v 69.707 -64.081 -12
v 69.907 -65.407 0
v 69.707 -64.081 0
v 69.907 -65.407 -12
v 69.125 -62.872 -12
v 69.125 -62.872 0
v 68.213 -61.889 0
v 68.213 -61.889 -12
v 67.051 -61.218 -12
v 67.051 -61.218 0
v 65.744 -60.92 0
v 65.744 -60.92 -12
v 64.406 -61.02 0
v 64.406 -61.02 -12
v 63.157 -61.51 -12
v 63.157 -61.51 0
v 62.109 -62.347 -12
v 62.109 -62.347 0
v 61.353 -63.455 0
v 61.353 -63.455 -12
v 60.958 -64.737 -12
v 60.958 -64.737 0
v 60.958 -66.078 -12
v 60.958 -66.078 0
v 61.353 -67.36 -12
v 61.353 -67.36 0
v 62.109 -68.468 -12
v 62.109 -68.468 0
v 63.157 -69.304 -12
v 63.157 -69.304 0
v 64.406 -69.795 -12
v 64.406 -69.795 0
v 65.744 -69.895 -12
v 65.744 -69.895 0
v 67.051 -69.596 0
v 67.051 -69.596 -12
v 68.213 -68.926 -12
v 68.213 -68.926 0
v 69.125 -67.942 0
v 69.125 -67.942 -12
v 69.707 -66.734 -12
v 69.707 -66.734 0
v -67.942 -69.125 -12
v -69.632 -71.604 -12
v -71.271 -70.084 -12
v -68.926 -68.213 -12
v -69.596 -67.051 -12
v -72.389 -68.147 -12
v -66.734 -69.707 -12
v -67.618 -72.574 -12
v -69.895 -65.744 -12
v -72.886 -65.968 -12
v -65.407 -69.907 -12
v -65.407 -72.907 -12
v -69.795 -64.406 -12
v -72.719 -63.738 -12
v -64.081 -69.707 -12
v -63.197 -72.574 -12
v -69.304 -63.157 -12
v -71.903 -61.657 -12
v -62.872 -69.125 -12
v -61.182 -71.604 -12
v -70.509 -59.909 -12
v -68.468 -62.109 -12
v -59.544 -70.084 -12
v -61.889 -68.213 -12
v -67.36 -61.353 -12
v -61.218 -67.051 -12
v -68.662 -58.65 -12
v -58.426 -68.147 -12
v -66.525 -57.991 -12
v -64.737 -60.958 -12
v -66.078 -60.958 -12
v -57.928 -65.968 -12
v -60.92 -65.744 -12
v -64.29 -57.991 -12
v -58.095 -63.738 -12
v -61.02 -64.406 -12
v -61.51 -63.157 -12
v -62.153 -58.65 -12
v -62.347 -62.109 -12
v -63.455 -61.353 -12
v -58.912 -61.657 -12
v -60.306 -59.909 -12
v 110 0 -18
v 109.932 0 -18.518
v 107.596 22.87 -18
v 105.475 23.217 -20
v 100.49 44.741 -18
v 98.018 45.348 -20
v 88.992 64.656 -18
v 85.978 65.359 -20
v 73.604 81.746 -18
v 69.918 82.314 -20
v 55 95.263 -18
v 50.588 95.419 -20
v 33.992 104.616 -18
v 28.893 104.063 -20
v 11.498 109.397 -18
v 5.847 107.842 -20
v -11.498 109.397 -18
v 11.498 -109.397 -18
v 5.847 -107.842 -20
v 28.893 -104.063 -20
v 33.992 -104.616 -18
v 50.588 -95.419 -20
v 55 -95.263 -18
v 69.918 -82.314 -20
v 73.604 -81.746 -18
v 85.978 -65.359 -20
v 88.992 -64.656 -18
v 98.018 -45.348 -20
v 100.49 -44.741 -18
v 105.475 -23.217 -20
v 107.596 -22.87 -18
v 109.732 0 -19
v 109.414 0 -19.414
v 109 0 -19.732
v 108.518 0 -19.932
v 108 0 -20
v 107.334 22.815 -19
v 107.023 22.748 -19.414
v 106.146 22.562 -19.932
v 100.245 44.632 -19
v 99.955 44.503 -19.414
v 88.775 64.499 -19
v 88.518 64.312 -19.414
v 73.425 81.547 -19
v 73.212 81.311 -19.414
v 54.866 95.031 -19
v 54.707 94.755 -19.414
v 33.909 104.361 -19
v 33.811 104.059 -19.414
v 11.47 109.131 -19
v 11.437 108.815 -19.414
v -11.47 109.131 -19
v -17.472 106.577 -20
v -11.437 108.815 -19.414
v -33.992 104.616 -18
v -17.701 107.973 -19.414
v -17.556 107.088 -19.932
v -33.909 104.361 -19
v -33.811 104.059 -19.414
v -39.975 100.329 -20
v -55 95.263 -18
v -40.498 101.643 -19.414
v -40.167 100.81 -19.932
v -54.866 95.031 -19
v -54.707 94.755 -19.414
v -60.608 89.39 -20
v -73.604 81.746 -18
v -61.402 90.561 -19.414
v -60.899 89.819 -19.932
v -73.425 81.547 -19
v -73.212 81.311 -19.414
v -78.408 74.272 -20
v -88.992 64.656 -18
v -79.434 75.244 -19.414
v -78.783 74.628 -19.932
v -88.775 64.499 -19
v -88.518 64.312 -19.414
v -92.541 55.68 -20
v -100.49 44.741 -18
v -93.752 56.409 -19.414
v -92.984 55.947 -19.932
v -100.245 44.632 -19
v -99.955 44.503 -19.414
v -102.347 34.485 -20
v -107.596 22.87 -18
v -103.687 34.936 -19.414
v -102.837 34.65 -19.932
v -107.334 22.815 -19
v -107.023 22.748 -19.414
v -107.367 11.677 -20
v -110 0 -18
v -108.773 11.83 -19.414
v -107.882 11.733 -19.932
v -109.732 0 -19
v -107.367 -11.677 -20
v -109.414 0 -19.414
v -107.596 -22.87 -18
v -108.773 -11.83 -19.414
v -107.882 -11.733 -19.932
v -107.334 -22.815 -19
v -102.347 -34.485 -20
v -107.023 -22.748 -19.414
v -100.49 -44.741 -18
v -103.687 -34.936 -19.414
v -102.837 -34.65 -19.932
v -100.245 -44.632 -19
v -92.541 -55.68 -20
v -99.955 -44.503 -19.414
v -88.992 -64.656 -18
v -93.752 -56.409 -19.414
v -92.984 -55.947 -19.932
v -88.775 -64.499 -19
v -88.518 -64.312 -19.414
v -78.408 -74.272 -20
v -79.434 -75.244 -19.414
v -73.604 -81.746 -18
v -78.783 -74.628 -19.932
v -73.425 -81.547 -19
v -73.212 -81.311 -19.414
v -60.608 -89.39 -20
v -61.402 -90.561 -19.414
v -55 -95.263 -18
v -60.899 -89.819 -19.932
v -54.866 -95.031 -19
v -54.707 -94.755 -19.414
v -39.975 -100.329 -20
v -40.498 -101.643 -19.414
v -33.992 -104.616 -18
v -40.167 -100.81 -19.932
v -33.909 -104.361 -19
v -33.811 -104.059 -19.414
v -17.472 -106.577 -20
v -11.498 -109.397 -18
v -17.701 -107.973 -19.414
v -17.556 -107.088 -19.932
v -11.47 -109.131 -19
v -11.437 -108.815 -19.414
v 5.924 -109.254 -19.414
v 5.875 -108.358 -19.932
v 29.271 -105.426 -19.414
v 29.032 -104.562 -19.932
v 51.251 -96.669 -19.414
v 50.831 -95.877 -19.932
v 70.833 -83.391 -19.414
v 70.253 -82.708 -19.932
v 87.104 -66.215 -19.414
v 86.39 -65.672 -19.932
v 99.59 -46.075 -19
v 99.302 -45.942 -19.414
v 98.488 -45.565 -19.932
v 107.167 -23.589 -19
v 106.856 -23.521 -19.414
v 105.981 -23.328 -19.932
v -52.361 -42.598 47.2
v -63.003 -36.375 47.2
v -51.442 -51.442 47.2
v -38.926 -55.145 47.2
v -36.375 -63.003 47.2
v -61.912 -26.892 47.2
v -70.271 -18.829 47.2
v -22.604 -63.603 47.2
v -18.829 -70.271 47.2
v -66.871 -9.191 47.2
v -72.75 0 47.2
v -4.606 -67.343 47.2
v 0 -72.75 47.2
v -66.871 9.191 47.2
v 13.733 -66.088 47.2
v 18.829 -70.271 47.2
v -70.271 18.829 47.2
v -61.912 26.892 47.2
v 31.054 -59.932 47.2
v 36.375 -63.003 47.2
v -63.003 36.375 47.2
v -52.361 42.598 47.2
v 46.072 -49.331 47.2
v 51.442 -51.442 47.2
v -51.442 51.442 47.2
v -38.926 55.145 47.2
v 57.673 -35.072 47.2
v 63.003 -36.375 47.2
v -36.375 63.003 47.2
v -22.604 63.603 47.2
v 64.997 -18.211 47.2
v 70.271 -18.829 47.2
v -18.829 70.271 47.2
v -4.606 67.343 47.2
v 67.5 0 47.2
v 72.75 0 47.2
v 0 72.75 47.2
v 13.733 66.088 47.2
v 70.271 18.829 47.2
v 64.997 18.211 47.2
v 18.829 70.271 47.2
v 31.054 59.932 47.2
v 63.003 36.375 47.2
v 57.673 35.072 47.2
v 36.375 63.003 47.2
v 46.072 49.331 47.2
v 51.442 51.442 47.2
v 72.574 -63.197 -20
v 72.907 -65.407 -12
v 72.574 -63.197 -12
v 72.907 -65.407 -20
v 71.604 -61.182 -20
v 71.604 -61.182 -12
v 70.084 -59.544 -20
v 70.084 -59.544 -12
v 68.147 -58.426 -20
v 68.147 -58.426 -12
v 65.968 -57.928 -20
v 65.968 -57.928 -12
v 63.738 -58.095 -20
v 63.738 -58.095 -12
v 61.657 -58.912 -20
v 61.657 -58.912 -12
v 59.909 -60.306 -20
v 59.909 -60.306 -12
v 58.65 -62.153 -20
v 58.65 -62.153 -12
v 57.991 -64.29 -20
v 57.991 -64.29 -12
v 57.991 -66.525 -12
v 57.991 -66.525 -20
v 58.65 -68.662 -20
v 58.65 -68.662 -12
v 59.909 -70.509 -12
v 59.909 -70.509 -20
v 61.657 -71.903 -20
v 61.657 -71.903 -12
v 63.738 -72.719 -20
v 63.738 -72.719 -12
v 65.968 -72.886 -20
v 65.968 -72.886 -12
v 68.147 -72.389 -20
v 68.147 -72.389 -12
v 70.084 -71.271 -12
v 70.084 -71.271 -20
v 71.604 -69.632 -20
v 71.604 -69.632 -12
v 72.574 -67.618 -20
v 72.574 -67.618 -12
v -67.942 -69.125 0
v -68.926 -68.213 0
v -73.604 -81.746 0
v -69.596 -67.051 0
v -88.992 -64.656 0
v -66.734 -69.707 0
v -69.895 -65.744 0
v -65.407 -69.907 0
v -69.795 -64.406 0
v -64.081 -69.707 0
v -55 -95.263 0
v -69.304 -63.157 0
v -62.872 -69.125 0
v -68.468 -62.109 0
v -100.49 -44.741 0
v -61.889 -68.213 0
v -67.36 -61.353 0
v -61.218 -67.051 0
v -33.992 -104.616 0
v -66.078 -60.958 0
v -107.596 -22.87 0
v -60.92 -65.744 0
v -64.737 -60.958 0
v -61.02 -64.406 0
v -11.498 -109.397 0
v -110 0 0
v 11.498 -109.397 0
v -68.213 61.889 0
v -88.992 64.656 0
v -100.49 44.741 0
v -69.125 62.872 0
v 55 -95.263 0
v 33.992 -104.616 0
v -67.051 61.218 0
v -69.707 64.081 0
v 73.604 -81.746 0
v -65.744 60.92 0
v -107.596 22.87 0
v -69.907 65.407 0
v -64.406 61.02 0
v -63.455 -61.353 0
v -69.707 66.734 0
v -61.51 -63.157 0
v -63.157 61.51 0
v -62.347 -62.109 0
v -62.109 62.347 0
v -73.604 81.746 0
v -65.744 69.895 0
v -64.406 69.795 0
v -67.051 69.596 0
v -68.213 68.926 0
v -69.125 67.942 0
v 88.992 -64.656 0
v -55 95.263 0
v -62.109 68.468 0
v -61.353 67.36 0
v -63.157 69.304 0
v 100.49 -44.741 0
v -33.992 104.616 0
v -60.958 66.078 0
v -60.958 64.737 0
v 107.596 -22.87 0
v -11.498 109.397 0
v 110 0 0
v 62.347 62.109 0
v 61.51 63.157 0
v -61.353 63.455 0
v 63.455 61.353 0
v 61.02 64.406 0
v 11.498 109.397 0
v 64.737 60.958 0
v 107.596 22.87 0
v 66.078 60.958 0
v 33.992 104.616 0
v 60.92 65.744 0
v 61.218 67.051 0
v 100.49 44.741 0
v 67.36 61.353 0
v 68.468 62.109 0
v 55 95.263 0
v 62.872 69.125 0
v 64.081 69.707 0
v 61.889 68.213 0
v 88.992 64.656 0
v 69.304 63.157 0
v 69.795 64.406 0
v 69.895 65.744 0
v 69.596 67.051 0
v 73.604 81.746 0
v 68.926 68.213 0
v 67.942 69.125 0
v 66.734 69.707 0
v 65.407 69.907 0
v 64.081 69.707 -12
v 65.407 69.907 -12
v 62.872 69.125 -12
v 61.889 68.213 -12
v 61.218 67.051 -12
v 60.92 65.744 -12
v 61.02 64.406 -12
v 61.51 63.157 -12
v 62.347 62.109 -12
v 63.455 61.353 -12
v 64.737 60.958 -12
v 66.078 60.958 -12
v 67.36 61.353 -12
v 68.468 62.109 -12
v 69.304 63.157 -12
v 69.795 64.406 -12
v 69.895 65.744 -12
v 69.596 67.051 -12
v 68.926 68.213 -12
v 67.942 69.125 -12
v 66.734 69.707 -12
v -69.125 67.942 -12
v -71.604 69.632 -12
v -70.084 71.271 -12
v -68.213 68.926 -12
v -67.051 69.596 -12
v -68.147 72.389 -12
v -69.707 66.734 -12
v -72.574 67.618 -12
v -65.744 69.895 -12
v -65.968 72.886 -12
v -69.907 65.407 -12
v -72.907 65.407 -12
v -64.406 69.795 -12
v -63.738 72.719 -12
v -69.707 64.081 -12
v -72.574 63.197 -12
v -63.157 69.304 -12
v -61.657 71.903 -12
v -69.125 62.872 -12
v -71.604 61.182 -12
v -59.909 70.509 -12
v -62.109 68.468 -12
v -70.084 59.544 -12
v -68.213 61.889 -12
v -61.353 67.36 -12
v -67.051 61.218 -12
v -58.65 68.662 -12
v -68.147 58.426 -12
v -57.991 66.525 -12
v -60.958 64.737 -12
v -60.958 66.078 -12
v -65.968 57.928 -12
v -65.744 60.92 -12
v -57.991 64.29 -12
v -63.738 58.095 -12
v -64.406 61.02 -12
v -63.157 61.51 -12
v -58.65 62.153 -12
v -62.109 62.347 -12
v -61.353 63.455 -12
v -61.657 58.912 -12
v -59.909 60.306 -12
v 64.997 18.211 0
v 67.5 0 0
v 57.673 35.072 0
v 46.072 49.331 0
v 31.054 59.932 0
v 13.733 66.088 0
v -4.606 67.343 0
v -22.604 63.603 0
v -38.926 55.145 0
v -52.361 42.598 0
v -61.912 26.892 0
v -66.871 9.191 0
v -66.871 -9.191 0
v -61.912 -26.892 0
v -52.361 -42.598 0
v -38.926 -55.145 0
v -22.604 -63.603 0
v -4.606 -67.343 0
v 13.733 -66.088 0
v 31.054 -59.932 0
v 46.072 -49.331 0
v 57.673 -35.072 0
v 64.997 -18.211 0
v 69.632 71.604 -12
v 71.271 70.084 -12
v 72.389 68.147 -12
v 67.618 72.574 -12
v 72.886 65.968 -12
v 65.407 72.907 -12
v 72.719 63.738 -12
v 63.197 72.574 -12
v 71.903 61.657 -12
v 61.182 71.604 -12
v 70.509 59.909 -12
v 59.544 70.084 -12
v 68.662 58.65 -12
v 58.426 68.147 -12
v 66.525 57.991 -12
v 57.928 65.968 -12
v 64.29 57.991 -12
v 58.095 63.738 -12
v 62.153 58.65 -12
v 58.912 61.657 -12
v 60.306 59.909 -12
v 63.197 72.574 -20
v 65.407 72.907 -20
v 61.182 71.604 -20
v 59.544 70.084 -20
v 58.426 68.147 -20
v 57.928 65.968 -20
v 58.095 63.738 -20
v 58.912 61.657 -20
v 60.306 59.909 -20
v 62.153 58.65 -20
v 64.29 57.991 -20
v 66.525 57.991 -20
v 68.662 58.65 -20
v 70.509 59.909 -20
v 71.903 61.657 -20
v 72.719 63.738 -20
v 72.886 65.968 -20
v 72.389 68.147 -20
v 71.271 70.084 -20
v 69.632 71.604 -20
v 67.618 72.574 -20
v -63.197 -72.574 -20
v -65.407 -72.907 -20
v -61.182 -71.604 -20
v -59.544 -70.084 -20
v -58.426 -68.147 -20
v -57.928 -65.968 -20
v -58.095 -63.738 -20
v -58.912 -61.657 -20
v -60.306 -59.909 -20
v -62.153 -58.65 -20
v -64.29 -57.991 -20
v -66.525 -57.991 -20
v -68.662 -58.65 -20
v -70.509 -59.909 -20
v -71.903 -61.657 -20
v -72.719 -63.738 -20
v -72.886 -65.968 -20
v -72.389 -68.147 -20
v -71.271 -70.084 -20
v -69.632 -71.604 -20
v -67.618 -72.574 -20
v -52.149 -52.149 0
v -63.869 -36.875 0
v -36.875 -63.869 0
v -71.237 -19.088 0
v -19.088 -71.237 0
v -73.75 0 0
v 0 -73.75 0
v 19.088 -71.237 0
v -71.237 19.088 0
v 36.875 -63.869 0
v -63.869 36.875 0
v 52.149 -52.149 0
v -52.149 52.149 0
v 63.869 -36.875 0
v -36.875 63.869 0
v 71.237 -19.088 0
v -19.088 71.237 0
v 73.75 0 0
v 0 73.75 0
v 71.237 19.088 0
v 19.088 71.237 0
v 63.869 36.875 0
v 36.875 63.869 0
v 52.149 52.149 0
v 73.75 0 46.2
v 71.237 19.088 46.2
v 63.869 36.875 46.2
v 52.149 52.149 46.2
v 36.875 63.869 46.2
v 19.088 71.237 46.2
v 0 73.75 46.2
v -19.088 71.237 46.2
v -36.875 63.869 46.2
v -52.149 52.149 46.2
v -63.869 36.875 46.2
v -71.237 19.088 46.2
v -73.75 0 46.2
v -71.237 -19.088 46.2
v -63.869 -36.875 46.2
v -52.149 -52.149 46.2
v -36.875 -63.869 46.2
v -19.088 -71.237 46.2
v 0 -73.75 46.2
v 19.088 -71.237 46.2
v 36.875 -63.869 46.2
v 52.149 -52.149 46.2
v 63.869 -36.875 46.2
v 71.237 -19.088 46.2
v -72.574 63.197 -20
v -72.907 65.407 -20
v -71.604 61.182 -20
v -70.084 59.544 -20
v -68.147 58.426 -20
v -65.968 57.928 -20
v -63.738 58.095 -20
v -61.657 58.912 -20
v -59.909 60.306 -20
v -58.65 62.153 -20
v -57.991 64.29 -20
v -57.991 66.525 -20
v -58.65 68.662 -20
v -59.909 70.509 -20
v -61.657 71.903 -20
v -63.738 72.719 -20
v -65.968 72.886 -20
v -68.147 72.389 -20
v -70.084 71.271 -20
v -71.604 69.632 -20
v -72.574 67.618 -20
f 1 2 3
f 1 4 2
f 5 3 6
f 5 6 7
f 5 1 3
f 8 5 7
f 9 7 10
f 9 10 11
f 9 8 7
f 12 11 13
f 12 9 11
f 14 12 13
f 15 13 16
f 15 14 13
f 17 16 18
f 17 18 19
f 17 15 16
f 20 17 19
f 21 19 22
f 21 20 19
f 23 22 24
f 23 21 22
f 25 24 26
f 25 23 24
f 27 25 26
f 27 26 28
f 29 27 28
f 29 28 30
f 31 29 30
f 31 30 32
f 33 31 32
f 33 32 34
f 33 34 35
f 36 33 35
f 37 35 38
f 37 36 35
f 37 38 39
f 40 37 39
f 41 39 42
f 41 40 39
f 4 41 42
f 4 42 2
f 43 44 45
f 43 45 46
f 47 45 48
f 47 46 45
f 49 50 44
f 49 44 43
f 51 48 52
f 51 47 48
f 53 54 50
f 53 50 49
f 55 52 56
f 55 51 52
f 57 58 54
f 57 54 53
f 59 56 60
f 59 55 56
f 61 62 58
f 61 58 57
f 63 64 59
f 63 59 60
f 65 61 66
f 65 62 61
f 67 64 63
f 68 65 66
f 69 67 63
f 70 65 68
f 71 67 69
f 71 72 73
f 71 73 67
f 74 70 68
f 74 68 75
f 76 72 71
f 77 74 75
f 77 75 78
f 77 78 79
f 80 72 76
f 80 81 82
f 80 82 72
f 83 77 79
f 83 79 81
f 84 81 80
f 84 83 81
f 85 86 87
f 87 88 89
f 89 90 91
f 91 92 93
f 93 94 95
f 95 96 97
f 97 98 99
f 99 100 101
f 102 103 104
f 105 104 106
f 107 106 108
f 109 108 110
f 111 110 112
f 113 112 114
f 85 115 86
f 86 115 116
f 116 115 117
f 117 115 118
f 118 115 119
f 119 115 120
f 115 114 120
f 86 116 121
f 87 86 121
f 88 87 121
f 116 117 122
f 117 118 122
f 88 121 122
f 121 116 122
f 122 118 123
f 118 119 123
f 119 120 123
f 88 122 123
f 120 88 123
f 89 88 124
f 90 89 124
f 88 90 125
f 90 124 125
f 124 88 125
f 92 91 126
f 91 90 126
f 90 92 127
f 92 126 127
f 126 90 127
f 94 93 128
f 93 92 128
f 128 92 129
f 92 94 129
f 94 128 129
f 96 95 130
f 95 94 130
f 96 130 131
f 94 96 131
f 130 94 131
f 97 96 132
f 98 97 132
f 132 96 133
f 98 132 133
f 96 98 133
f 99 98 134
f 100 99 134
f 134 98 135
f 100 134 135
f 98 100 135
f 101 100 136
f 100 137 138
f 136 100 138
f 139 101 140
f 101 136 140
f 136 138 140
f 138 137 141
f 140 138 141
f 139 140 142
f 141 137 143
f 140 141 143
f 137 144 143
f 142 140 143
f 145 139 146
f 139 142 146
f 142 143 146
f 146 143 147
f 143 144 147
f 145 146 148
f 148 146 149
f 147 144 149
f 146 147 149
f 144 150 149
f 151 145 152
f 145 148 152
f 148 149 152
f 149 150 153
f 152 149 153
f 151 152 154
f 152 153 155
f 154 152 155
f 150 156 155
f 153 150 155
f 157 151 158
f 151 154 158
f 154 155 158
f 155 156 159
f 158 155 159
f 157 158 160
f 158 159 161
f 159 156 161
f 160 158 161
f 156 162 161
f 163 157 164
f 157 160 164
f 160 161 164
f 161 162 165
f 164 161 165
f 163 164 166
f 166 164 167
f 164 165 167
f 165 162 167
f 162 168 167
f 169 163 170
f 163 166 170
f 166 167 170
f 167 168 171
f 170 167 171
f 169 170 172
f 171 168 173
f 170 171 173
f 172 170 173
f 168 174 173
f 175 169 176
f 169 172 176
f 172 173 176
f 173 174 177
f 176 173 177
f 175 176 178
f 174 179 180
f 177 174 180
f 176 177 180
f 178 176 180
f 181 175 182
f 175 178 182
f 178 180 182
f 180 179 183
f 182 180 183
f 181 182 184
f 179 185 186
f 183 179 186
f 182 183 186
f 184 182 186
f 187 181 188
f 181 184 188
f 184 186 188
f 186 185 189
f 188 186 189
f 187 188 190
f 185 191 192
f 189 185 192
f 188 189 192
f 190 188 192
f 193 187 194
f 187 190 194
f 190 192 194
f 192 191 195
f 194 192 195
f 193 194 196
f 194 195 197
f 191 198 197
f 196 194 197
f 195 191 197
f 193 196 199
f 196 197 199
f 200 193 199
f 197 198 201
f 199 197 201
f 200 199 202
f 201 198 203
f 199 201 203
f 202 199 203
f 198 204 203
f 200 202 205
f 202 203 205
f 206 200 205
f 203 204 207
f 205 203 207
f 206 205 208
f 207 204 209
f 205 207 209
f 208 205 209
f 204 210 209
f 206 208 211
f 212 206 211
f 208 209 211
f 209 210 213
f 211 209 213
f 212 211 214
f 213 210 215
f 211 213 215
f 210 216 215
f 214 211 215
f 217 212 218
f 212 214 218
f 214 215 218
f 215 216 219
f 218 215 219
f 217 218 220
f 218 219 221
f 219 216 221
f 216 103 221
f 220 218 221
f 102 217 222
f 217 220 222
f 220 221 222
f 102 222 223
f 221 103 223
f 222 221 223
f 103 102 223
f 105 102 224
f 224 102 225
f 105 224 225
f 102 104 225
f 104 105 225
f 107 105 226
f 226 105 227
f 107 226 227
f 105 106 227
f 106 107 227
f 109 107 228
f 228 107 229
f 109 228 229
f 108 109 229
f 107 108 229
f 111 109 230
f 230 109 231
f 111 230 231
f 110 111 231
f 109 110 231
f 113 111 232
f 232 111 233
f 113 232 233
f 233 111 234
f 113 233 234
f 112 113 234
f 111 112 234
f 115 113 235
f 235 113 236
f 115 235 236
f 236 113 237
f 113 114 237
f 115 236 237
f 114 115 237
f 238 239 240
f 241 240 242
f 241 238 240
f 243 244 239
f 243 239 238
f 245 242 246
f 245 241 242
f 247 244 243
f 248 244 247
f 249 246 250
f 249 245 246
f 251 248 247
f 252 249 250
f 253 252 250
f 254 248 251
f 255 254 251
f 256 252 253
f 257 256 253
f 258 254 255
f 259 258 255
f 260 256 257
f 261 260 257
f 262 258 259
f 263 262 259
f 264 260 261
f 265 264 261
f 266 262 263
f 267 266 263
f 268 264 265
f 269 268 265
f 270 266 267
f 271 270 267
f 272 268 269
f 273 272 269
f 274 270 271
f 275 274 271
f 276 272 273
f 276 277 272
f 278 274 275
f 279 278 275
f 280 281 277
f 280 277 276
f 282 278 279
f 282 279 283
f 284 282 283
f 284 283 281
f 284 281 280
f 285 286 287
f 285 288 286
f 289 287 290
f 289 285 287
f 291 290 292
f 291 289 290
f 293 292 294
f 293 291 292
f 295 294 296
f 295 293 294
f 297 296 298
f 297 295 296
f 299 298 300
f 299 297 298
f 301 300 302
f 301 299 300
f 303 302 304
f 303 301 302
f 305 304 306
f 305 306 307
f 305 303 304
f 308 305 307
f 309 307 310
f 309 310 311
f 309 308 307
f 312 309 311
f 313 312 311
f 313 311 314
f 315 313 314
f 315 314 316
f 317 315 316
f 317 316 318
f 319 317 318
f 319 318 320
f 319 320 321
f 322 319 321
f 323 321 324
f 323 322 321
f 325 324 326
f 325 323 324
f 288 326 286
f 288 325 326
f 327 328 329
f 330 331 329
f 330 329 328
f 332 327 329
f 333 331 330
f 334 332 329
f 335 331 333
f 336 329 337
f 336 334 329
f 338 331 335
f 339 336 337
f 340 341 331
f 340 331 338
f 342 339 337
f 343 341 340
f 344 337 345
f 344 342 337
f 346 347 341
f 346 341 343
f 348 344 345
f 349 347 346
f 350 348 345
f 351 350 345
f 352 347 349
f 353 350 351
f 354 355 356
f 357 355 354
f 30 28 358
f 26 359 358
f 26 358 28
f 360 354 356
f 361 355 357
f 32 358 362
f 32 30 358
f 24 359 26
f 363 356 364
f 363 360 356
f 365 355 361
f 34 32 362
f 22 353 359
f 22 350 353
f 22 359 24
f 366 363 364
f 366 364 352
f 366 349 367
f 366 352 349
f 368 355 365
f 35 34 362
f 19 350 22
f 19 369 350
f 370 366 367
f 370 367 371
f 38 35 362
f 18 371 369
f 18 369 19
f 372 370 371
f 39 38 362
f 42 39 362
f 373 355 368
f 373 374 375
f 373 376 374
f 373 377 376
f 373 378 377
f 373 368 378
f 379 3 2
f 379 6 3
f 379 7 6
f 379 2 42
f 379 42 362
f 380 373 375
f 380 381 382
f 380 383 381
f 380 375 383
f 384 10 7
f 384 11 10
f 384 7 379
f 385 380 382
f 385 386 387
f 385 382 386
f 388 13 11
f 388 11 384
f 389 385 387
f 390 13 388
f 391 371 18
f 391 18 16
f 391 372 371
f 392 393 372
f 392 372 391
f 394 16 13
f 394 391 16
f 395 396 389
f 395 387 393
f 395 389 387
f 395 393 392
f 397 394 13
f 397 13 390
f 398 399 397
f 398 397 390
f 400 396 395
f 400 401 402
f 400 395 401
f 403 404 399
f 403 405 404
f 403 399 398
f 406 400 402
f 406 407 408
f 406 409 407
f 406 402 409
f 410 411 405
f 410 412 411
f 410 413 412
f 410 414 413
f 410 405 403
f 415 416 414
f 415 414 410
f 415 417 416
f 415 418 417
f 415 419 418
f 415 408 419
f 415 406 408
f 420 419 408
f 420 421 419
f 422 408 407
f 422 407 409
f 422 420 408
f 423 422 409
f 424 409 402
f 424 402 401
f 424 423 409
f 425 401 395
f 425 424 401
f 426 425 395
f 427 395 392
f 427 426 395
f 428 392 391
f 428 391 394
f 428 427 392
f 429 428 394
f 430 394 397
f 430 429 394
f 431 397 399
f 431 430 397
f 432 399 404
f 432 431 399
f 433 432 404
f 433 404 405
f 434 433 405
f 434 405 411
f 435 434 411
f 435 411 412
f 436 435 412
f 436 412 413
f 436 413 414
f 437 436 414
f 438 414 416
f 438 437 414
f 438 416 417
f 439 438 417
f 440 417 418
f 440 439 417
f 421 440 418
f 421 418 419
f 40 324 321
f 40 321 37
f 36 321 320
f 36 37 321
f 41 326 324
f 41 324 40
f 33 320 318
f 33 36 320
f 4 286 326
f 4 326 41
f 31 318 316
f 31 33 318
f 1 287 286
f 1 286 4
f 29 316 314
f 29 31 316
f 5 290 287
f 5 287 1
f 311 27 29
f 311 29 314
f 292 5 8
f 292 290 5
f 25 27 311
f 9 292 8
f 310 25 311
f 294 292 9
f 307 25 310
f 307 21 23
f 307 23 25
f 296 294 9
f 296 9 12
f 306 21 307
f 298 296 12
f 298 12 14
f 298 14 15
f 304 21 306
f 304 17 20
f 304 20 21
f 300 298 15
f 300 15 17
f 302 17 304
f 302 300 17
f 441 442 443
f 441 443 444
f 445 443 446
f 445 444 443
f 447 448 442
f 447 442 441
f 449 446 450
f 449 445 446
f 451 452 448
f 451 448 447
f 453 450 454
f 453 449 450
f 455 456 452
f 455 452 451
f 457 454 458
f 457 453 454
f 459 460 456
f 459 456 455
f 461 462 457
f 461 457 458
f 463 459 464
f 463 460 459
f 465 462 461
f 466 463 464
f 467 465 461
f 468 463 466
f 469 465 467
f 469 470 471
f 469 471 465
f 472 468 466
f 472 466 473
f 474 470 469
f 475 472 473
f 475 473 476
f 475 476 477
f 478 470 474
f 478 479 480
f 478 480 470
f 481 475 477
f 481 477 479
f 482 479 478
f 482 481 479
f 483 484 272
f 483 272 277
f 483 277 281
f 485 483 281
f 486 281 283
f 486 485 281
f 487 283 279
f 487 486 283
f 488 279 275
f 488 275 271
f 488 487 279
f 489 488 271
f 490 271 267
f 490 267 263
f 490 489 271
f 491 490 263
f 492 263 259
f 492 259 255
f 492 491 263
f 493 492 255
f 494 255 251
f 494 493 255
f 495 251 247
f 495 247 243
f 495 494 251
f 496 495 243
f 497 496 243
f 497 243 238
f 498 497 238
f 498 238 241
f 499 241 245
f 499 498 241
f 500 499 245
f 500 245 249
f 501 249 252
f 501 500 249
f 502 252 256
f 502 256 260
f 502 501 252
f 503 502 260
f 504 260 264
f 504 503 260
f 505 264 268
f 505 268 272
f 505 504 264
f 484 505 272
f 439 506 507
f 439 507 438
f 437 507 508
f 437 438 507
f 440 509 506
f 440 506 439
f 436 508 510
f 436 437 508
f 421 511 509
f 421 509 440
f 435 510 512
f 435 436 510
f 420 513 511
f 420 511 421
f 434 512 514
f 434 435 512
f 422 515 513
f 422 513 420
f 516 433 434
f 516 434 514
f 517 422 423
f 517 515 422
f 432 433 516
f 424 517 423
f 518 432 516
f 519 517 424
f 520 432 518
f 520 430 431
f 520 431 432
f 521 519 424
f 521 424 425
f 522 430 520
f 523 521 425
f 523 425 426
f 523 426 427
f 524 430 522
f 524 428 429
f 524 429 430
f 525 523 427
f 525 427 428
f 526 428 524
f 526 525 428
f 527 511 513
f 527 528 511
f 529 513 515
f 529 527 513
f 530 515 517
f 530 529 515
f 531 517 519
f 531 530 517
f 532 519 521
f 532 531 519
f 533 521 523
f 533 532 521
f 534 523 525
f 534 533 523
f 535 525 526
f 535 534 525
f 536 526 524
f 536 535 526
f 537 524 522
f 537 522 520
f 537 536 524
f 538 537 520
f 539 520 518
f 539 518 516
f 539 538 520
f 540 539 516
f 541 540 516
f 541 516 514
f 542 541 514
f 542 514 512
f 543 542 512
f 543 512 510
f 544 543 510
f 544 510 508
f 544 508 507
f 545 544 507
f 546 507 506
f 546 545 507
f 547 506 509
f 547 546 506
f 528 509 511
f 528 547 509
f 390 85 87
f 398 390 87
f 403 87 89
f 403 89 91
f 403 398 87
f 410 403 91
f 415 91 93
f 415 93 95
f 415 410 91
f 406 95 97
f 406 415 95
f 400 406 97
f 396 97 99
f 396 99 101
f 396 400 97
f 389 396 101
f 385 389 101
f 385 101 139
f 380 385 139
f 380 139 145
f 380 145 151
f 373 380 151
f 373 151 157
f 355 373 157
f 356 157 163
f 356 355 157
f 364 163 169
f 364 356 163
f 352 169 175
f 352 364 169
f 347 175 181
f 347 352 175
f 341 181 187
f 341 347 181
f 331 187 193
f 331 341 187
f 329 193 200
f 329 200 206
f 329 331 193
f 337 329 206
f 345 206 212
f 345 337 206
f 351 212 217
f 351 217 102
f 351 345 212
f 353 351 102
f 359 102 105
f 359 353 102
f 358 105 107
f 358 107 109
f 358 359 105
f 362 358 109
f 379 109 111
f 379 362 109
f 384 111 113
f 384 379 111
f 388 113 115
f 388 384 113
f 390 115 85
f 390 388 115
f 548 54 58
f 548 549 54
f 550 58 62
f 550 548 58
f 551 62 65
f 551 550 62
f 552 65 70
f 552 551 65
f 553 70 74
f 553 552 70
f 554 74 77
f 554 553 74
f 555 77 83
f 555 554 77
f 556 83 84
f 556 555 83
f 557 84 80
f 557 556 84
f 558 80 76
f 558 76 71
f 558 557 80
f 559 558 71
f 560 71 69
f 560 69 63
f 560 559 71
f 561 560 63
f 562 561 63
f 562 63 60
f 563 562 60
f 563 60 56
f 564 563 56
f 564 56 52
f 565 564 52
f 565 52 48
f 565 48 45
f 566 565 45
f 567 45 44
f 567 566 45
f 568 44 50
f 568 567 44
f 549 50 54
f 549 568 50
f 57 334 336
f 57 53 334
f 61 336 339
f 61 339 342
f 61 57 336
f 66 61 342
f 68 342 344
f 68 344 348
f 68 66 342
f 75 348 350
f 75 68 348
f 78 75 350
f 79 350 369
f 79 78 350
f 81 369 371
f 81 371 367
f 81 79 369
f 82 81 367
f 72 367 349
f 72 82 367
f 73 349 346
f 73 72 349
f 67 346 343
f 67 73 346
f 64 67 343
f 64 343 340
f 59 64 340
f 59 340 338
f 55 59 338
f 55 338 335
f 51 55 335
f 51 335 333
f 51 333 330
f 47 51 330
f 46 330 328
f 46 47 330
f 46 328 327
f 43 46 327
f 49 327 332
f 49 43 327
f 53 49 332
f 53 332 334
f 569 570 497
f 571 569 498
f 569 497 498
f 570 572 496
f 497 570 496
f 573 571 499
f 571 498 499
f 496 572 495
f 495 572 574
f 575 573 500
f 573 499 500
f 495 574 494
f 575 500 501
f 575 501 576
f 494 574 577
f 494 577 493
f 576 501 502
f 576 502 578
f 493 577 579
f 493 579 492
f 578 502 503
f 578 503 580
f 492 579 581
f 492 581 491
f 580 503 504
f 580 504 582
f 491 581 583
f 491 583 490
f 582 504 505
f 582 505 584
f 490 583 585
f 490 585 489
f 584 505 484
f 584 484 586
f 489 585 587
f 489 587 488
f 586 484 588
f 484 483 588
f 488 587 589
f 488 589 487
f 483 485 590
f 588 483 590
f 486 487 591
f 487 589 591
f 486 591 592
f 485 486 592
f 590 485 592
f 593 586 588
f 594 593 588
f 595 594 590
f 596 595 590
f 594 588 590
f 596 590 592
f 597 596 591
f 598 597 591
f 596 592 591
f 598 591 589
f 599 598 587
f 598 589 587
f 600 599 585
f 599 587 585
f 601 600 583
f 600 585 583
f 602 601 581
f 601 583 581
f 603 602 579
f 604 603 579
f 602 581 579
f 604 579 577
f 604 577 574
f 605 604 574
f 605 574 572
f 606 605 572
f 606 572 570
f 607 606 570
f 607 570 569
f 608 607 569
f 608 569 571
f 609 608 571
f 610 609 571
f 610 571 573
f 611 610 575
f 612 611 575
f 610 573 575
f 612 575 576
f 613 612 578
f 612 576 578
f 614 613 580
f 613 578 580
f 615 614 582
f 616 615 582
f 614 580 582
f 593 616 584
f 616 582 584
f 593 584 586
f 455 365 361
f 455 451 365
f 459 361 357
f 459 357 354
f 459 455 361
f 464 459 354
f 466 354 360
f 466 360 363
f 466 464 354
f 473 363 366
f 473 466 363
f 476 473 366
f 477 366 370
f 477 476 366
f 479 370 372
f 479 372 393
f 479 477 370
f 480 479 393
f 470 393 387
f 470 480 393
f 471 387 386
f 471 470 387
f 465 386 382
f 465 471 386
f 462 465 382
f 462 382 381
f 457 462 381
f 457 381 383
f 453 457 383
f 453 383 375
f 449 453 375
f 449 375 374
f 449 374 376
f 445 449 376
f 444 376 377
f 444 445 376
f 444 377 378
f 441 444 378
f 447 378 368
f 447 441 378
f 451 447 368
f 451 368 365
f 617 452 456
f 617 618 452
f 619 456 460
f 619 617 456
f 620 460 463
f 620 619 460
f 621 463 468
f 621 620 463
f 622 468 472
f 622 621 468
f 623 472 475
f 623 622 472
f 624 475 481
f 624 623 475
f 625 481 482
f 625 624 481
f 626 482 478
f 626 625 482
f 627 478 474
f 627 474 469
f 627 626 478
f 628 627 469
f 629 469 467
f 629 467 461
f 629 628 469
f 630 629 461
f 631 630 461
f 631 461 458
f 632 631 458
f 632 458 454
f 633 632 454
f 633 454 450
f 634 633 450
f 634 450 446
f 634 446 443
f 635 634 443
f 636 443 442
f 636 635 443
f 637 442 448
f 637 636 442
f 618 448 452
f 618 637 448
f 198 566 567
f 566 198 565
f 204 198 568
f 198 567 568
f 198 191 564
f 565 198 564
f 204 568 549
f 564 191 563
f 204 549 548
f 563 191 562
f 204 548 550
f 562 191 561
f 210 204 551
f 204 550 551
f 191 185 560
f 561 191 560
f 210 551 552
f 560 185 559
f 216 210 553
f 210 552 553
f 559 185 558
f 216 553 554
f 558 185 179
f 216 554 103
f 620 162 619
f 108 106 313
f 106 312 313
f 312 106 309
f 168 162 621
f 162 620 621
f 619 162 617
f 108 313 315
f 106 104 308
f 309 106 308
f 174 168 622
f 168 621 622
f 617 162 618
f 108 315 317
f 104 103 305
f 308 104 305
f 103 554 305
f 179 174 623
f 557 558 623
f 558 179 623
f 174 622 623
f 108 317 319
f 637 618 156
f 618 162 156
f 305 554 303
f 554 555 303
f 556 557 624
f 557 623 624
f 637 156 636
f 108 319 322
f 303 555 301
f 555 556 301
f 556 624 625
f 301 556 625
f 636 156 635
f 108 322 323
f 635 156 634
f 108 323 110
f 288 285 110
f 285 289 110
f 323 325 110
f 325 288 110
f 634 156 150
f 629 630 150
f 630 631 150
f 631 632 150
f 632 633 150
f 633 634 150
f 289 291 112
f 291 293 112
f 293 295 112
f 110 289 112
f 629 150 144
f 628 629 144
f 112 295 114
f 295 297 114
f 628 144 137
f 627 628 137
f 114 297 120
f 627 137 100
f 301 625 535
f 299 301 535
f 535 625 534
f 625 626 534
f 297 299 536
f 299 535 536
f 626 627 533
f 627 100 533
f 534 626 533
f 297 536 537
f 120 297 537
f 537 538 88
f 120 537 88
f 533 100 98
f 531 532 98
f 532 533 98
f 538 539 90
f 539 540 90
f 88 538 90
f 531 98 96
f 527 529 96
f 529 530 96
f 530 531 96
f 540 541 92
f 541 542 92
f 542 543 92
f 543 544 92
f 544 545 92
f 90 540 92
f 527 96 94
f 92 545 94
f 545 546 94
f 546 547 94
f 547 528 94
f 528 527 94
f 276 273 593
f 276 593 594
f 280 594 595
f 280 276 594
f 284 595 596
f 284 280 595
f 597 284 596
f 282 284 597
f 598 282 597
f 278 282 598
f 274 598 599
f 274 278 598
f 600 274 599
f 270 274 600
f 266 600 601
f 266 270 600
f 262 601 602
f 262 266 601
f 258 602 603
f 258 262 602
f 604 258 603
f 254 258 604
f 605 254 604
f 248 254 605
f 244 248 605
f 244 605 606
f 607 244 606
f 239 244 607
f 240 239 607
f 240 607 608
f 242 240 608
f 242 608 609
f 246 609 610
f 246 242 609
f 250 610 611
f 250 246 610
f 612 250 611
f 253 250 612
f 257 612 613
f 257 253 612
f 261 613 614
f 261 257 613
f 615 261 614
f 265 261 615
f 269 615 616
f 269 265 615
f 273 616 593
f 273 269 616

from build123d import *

# Parameters (mm, degrees)
SCHIZZO1_R                   = 110
ESTRUSIONE_ESTRUSIONE1_DEPTH = 20
SCHIZZO2_R                   = 73.75
SCHIZZO2_R_2                 = 67.5
ESTRUSIONE_ESTRUSIONE2_DEPTH = 47.2
RIPETIZIONECIRCOLARE2_COUNT  = 4
RACCORDO1_R                  = 2
SMUSSO1_SIZE                 = 1


with BuildPart() as part:
    # Schizzo1 → Estrusione-Estrusione1 (new body)
    with BuildSketch(Plane.XY):
        Circle(SCHIZZO1_R)
    extrude(amount=-ESTRUSIONE_ESTRUSIONE1_DEPTH)

    # Schizzo7 → Foro lamato per Vite M8 a testa cilindrica piana-1 (revolve, cut)
    with BuildSketch(Plane(origin=(65.40737726, 65.40737726, -20), x_dir=(0, 1, 0), z_dir=(1, 0, 0))):
        Polygon((0, 0), (0, 20), (4.5, 20), (4.5, 8), (7.5, 8), (7.5, 0), align=None)
    foro_lamato_per_vite_m8_a_testa_cilindri = revolve(axis=Axis((65.40737726, 65.40737726, -26.35), (0, 0, 1)), mode=Mode.SUBTRACT)

    # RipetizioneCircolare2: Foro lamato per Vite M8 a testa cilindrica piana-1 ×4 about axis
    ripetizionecircolare2_axis = Axis((0, 0, 0), (0, 0, 1))
    for i in range(1, RIPETIZIONECIRCOLARE2_COUNT):
        add(foro_lamato_per_vite_m8_a_testa_cilindri.rotate(ripetizionecircolare2_axis, i * 360 / RIPETIZIONECIRCOLARE2_COUNT), mode=Mode.SUBTRACT)

    # Raccordo1
    raccordo1_edges = [part.edges().sort_by_distance(p)[0] for p in [
        (-110, 0, -20),
    ]]
    fillet(raccordo1_edges, radius=RACCORDO1_R)


with BuildPart() as body_2:
    # Schizzo2 → Estrusione-Estrusione2 (new body)
    with BuildSketch(Plane.XY):
        Circle(SCHIZZO2_R)
        Circle(SCHIZZO2_R_2, mode=Mode.SUBTRACT)
    extrude(amount=ESTRUSIONE_ESTRUSIONE2_DEPTH)

    # Smusso1
    smusso1_edges = [body_2.edges().sort_by_distance(p)[0] for p in [
        (-73.75, 0, 47.2),
    ]]
    chamfer(smusso1_edges, length=SMUSSO1_SIZE)


solid = Compound([part.part, body_2.part])
